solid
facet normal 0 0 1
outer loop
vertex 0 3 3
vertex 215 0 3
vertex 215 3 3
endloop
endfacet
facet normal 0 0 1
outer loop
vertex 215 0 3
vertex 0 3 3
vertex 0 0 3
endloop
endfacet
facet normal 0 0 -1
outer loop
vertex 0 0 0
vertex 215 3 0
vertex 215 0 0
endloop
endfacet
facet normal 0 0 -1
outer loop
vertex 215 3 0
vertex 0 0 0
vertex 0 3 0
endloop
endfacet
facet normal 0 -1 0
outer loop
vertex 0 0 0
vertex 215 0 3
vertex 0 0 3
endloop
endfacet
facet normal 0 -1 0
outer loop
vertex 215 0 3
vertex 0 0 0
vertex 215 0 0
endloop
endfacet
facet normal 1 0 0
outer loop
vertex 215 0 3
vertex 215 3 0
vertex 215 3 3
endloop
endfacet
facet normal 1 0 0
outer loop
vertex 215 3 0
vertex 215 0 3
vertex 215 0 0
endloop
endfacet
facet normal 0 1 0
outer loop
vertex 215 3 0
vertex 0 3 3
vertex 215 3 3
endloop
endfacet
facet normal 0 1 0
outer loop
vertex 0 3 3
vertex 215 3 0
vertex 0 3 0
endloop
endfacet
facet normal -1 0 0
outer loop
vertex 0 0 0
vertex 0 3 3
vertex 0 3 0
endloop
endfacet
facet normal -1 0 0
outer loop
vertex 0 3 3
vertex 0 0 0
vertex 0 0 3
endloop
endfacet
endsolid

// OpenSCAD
// HDRY TPU gasket strip — printable substitute for channel gasket
// Cross-section default: 3 mm wide × 3 mm thick (fills both sides of channel)
// (kit tape is 6×3; channel fit: 3 wide; depth 3 so both faces seal)
//
// Modes:
//   straight  — one bar, length_mm must fit bed
//   coil      — serpentine pack for long runs on bed_mm square
//   segments  — export one bed-sized piece; set which_seg 0..n-1
//
// Print: TPU, 2–3 walls, 0–15% gyroid, no supports, flat on bed (thick_mm = Z).

length_mm   = 215;
width_mm    = 3;     // across channel (Y)
thick_mm    = 3;     // depth / print Z — fills both sides
mode        = "straight"; // straight | coil | segments
bed_mm      = 220;
coil_gap    = 2;
segment_mm  = 220;
which_seg   = 0;
width_extra = 0.0;
thick_extra = 0.0;

w = width_mm + width_extra;
t = thick_mm + thick_extra;

module strip_straight(L) {
    cube([max(L, 0.01), w, t], center = false);
}

// Serpentine folds a long strip onto the bed
module strip_serpentine(L) {
    pitch = w + coil_gap;
    usable = bed_mm - 2;
    row_len = usable;
    n_rows = max(1, ceil(L / row_len));
    for (r = [0 : n_rows - 1]) {
        remain_start = r * row_len;
        this_len = min(row_len, max(0, L - remain_start));
        if (this_len > 0.01) {
            y = r * pitch;
            if (r % 2 == 0) {
                translate([0, y, 0]) cube([this_len, w, t]);
            } else {
                translate([row_len - this_len, y, 0]) cube([this_len, w, t]);
            }
            if (r > 0) {
                xj = (r % 2 == 0) ? 0 : (row_len - w);
                translate([xj, (r - 1) * pitch + w - 0.01, 0])
                    cube([w, pitch - w + 0.02, t]);
            }
        }
    }
}

n_seg = max(1, ceil(length_mm / segment_mm));
seg_L = (which_seg >= n_seg - 1)
    ? length_mm - segment_mm * (n_seg - 1)
    : segment_mm;

if (mode == "straight") {
    strip_straight(length_mm);
} else if (mode == "coil") {
    strip_serpentine(length_mm);
} else { // segments
    strip_straight(max(seg_L, 0.01));
}
